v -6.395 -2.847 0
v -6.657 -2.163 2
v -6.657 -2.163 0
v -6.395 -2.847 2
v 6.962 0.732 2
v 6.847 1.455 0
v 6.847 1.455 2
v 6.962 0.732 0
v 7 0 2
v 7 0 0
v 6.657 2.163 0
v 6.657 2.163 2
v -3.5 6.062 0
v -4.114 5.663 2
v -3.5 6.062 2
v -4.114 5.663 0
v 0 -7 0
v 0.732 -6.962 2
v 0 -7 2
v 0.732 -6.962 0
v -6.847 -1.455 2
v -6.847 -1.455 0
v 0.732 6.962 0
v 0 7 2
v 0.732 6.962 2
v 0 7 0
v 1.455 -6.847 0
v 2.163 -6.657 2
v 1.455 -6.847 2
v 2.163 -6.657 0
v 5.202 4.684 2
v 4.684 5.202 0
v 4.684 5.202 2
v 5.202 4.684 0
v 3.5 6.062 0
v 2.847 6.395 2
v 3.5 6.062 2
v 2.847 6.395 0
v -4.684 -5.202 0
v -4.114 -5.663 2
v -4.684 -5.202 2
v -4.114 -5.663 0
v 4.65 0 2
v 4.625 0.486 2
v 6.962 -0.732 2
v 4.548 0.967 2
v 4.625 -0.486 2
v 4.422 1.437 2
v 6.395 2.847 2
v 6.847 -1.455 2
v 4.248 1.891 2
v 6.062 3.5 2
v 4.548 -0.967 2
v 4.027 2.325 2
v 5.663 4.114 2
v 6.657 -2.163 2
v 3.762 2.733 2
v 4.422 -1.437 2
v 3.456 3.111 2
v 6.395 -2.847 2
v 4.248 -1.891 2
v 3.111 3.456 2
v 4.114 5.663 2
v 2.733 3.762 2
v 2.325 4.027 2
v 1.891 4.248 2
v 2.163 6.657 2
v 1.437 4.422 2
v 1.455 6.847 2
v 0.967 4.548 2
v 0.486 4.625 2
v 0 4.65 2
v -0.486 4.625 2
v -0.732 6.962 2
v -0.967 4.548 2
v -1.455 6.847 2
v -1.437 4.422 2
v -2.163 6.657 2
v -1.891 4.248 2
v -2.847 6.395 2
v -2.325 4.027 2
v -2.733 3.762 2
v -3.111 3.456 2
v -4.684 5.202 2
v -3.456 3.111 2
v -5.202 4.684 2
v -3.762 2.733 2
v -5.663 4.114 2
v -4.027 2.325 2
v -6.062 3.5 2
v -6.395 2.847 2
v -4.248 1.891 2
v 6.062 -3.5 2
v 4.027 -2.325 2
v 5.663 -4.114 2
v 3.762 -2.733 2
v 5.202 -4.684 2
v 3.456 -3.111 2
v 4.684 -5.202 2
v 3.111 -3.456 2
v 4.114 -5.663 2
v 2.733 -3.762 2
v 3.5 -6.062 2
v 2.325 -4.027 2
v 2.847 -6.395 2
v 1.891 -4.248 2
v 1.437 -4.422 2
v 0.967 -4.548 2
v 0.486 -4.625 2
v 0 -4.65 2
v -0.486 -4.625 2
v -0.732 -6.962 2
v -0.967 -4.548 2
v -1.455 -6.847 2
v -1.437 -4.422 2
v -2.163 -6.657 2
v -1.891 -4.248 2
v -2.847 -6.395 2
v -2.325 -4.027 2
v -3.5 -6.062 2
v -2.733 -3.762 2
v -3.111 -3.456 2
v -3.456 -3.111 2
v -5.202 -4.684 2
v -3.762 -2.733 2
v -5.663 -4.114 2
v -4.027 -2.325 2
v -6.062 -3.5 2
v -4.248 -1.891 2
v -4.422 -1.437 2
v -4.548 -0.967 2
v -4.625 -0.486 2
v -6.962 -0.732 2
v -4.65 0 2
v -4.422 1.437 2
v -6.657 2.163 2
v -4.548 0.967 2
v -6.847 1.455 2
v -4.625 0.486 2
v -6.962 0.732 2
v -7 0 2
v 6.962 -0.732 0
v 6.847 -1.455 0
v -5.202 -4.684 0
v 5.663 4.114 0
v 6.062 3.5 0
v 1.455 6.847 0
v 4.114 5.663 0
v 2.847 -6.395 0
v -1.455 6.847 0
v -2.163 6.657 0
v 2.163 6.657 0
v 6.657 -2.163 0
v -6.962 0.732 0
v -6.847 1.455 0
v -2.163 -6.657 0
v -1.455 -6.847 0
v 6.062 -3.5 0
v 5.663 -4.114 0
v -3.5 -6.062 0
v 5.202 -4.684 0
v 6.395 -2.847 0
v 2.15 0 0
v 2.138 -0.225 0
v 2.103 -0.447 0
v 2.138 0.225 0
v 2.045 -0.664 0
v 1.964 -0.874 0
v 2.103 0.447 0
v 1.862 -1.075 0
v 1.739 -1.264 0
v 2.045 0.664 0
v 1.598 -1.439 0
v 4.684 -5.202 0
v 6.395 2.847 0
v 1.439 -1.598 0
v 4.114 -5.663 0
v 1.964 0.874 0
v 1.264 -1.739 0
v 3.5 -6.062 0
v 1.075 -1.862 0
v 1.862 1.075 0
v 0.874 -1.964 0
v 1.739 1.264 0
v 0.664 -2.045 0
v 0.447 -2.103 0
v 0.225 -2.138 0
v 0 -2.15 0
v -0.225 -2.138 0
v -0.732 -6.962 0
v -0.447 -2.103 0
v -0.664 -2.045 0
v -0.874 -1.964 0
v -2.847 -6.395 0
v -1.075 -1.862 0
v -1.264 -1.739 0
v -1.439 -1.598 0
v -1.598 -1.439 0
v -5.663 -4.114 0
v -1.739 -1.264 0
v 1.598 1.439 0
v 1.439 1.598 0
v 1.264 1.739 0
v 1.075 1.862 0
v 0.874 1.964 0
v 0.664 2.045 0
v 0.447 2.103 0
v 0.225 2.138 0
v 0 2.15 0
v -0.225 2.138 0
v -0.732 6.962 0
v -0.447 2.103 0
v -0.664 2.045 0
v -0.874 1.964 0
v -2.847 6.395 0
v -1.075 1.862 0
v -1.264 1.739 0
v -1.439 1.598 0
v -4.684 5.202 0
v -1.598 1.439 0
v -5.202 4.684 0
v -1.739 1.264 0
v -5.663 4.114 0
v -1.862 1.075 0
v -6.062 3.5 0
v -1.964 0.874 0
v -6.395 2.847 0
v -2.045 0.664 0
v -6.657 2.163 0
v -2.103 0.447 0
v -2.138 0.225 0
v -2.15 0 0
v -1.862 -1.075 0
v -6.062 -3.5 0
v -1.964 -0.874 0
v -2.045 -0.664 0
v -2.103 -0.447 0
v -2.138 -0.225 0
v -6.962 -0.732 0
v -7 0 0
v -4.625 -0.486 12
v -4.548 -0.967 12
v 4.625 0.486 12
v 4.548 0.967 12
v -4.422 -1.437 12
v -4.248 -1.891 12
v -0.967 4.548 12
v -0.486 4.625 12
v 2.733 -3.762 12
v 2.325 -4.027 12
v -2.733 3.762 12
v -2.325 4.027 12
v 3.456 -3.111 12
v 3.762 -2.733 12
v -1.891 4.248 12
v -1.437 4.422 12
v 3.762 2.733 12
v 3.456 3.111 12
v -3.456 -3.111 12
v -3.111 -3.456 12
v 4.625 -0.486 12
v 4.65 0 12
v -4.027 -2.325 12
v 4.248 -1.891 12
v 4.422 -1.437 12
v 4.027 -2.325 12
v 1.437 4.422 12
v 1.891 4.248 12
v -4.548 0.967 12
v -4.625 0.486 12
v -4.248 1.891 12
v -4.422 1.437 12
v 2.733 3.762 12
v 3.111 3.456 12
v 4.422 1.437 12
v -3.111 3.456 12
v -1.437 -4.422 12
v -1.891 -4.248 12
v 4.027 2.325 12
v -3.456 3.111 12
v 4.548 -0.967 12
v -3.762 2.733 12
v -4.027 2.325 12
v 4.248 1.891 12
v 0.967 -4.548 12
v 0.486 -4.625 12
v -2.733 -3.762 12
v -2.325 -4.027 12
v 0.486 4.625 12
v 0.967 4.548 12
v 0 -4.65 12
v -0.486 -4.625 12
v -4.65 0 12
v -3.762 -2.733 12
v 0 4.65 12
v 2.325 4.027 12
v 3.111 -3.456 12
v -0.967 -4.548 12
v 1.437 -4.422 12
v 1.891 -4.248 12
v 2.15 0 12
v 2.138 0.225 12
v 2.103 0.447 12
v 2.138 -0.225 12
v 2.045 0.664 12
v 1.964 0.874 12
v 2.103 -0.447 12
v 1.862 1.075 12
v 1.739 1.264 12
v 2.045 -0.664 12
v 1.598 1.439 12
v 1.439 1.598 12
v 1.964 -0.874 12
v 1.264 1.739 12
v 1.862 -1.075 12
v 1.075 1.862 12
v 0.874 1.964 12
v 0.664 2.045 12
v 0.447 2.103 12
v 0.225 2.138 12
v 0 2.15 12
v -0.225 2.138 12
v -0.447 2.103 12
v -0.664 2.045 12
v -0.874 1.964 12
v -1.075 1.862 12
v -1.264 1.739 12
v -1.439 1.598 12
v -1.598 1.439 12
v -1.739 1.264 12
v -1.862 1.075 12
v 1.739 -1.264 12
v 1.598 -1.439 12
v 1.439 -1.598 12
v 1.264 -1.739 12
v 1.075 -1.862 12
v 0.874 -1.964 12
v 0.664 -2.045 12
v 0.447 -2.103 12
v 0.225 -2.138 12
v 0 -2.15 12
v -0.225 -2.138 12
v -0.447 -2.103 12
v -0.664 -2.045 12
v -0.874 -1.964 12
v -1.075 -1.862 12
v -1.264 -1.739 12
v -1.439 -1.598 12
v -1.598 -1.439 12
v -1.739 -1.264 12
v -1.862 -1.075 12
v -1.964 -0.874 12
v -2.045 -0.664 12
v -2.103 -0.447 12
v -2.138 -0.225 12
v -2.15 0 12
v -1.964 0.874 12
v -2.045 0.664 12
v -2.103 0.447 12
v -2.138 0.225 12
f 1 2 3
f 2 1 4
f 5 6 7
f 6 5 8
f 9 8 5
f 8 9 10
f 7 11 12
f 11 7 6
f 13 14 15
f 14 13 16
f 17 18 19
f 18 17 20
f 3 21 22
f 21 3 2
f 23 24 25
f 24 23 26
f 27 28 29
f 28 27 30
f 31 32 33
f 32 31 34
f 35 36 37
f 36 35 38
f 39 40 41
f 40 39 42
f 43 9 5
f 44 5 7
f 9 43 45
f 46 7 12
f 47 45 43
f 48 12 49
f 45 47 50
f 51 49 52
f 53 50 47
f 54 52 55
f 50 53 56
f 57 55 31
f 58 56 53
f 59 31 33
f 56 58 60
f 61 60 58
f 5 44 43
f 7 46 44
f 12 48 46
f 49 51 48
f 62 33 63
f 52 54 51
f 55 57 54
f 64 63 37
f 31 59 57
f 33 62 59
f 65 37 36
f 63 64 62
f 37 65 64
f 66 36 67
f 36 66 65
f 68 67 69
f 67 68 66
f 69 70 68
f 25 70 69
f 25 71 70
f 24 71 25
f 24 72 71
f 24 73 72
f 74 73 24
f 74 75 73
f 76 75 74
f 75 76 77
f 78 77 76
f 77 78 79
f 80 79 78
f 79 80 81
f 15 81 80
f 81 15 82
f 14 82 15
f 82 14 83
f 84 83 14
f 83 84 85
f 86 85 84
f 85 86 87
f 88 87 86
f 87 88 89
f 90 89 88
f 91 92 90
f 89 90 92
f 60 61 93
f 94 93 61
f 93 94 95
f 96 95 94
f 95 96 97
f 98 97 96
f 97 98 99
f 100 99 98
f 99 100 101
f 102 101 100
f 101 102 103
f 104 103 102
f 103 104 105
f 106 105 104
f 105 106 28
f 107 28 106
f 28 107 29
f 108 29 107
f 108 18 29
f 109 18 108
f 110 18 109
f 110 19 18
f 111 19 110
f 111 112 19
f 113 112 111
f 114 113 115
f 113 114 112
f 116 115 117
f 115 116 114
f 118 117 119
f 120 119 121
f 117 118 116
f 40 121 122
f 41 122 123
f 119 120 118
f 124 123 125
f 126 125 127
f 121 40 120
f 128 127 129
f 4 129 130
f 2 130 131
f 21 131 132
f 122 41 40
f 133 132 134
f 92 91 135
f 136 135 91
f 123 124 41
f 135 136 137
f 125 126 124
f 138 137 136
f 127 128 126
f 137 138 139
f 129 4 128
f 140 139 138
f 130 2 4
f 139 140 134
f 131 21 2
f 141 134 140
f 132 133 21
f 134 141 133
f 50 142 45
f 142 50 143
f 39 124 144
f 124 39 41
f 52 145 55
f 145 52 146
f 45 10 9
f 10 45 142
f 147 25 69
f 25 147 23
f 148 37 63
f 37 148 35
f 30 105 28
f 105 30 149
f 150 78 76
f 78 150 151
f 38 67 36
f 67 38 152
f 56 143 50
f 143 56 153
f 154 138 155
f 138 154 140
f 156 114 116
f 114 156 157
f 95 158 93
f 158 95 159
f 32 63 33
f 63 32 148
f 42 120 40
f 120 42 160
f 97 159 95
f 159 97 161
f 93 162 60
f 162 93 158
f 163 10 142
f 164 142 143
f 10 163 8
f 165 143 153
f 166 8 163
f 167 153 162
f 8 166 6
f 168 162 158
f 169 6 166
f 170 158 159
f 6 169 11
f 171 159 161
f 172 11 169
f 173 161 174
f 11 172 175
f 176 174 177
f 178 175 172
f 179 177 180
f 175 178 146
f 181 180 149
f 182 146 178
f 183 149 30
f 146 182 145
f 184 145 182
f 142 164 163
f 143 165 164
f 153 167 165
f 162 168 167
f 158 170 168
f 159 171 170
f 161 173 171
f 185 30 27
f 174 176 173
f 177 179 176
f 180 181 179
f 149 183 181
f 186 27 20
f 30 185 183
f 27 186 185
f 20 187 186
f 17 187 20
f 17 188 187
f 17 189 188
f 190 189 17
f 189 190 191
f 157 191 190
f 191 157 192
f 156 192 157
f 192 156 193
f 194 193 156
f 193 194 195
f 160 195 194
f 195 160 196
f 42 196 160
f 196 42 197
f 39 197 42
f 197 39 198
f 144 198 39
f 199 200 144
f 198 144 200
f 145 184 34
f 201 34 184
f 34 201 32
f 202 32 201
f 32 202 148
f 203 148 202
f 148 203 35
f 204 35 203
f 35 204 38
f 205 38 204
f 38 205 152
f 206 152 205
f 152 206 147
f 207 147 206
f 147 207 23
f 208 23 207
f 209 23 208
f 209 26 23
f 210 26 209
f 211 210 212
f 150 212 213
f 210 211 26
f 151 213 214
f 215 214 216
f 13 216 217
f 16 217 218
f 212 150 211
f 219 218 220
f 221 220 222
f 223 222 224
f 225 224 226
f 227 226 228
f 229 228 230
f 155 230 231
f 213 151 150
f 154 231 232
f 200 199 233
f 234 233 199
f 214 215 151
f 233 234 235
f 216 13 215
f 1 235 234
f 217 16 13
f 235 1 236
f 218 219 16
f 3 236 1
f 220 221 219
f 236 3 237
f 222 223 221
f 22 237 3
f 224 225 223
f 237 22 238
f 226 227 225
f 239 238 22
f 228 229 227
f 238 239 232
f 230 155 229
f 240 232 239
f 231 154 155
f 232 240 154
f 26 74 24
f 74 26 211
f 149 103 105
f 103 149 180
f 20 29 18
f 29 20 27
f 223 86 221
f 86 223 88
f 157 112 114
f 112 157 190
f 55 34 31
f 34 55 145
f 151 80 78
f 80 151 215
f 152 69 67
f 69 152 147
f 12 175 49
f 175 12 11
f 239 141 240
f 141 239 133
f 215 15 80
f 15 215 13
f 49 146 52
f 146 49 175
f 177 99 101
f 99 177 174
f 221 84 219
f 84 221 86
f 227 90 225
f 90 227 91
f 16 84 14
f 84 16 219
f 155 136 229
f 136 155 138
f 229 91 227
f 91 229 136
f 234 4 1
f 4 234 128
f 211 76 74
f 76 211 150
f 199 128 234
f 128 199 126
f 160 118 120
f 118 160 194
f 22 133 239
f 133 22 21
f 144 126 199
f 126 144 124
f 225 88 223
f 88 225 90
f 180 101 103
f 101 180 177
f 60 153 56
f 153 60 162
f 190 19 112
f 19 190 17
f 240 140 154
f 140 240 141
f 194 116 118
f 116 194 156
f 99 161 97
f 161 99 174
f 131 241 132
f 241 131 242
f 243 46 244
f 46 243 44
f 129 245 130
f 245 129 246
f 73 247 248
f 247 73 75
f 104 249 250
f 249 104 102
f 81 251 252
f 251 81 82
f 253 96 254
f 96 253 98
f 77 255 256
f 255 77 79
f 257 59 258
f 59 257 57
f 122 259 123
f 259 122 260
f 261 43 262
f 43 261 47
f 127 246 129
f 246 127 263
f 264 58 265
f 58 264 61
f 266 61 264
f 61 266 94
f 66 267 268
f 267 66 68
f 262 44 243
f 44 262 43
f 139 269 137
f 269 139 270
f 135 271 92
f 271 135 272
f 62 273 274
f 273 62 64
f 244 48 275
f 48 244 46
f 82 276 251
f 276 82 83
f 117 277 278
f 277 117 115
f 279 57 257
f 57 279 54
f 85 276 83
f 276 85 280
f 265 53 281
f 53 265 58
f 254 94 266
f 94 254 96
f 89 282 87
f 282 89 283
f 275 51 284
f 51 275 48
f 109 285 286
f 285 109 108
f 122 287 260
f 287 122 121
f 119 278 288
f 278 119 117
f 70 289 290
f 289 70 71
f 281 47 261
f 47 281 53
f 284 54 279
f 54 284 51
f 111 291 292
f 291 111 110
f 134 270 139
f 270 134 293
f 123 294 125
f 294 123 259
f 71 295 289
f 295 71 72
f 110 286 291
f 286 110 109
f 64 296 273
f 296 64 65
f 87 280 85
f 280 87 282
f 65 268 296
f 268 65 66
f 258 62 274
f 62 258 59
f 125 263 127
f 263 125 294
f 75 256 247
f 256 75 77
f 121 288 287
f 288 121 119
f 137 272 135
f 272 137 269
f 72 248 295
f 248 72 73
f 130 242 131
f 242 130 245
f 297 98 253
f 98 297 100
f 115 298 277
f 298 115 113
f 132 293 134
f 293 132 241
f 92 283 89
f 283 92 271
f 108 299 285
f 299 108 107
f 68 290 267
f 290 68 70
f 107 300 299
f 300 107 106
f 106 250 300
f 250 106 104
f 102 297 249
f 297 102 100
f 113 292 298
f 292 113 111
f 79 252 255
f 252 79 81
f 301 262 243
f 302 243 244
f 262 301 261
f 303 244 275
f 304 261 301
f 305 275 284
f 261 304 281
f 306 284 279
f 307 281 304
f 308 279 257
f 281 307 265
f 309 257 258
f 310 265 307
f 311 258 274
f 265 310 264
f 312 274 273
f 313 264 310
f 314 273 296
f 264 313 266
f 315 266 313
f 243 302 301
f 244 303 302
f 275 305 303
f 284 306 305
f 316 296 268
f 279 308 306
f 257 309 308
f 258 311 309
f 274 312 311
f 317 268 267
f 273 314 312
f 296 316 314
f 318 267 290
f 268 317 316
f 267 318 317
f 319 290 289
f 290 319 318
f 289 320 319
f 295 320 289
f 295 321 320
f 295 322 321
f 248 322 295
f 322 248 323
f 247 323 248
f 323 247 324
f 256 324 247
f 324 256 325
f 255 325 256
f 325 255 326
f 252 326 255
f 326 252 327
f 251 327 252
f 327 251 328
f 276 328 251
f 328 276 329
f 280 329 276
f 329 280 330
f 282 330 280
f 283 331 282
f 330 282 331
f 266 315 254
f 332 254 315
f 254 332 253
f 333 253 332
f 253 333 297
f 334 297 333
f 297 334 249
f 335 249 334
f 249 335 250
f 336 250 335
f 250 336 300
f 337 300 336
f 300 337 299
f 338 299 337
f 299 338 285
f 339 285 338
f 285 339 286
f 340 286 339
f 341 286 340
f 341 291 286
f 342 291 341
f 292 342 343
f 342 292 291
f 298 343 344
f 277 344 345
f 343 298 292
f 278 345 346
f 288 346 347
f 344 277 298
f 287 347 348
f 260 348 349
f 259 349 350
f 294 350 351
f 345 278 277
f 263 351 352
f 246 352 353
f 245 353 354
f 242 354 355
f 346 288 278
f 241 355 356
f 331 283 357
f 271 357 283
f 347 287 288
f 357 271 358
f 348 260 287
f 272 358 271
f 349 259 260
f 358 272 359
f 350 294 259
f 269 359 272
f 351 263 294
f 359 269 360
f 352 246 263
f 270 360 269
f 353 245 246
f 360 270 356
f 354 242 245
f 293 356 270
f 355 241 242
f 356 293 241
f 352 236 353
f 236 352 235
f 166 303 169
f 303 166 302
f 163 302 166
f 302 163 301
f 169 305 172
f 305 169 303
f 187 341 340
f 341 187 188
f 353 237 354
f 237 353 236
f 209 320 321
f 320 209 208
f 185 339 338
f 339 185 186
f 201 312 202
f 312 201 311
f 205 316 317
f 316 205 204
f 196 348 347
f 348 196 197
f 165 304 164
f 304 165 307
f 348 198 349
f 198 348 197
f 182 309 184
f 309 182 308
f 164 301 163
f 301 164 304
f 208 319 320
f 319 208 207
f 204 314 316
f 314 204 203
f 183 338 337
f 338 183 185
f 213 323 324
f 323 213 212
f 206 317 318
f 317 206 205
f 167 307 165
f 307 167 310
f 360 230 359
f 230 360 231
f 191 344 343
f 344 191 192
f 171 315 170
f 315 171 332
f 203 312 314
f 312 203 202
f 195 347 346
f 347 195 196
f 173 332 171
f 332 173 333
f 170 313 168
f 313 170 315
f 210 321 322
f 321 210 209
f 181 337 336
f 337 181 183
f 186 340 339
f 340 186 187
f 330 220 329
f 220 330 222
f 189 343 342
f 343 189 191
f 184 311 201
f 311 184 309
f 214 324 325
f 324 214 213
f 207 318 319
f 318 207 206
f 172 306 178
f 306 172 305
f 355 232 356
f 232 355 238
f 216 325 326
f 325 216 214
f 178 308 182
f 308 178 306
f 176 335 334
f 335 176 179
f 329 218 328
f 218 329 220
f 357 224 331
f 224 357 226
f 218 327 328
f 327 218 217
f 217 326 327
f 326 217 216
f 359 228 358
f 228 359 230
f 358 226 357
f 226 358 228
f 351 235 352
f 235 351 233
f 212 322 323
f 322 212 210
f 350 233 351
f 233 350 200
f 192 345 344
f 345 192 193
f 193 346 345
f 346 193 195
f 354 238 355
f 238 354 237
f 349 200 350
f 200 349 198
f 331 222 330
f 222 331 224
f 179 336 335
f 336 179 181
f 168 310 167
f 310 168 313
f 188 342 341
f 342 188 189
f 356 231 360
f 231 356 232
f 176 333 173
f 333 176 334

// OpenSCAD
// Wall-mount standoff with screw flange.
$fn = 60;
eps = 0.02;
thread_d = 4.3;
base_d = 14;
length = 12;
difference() { union() { cylinder(d=base_d,h=2); cylinder(d=thread_d+5,h=length); } translate([0,0,-eps]) cylinder(d=thread_d,h=length+2*eps); }
